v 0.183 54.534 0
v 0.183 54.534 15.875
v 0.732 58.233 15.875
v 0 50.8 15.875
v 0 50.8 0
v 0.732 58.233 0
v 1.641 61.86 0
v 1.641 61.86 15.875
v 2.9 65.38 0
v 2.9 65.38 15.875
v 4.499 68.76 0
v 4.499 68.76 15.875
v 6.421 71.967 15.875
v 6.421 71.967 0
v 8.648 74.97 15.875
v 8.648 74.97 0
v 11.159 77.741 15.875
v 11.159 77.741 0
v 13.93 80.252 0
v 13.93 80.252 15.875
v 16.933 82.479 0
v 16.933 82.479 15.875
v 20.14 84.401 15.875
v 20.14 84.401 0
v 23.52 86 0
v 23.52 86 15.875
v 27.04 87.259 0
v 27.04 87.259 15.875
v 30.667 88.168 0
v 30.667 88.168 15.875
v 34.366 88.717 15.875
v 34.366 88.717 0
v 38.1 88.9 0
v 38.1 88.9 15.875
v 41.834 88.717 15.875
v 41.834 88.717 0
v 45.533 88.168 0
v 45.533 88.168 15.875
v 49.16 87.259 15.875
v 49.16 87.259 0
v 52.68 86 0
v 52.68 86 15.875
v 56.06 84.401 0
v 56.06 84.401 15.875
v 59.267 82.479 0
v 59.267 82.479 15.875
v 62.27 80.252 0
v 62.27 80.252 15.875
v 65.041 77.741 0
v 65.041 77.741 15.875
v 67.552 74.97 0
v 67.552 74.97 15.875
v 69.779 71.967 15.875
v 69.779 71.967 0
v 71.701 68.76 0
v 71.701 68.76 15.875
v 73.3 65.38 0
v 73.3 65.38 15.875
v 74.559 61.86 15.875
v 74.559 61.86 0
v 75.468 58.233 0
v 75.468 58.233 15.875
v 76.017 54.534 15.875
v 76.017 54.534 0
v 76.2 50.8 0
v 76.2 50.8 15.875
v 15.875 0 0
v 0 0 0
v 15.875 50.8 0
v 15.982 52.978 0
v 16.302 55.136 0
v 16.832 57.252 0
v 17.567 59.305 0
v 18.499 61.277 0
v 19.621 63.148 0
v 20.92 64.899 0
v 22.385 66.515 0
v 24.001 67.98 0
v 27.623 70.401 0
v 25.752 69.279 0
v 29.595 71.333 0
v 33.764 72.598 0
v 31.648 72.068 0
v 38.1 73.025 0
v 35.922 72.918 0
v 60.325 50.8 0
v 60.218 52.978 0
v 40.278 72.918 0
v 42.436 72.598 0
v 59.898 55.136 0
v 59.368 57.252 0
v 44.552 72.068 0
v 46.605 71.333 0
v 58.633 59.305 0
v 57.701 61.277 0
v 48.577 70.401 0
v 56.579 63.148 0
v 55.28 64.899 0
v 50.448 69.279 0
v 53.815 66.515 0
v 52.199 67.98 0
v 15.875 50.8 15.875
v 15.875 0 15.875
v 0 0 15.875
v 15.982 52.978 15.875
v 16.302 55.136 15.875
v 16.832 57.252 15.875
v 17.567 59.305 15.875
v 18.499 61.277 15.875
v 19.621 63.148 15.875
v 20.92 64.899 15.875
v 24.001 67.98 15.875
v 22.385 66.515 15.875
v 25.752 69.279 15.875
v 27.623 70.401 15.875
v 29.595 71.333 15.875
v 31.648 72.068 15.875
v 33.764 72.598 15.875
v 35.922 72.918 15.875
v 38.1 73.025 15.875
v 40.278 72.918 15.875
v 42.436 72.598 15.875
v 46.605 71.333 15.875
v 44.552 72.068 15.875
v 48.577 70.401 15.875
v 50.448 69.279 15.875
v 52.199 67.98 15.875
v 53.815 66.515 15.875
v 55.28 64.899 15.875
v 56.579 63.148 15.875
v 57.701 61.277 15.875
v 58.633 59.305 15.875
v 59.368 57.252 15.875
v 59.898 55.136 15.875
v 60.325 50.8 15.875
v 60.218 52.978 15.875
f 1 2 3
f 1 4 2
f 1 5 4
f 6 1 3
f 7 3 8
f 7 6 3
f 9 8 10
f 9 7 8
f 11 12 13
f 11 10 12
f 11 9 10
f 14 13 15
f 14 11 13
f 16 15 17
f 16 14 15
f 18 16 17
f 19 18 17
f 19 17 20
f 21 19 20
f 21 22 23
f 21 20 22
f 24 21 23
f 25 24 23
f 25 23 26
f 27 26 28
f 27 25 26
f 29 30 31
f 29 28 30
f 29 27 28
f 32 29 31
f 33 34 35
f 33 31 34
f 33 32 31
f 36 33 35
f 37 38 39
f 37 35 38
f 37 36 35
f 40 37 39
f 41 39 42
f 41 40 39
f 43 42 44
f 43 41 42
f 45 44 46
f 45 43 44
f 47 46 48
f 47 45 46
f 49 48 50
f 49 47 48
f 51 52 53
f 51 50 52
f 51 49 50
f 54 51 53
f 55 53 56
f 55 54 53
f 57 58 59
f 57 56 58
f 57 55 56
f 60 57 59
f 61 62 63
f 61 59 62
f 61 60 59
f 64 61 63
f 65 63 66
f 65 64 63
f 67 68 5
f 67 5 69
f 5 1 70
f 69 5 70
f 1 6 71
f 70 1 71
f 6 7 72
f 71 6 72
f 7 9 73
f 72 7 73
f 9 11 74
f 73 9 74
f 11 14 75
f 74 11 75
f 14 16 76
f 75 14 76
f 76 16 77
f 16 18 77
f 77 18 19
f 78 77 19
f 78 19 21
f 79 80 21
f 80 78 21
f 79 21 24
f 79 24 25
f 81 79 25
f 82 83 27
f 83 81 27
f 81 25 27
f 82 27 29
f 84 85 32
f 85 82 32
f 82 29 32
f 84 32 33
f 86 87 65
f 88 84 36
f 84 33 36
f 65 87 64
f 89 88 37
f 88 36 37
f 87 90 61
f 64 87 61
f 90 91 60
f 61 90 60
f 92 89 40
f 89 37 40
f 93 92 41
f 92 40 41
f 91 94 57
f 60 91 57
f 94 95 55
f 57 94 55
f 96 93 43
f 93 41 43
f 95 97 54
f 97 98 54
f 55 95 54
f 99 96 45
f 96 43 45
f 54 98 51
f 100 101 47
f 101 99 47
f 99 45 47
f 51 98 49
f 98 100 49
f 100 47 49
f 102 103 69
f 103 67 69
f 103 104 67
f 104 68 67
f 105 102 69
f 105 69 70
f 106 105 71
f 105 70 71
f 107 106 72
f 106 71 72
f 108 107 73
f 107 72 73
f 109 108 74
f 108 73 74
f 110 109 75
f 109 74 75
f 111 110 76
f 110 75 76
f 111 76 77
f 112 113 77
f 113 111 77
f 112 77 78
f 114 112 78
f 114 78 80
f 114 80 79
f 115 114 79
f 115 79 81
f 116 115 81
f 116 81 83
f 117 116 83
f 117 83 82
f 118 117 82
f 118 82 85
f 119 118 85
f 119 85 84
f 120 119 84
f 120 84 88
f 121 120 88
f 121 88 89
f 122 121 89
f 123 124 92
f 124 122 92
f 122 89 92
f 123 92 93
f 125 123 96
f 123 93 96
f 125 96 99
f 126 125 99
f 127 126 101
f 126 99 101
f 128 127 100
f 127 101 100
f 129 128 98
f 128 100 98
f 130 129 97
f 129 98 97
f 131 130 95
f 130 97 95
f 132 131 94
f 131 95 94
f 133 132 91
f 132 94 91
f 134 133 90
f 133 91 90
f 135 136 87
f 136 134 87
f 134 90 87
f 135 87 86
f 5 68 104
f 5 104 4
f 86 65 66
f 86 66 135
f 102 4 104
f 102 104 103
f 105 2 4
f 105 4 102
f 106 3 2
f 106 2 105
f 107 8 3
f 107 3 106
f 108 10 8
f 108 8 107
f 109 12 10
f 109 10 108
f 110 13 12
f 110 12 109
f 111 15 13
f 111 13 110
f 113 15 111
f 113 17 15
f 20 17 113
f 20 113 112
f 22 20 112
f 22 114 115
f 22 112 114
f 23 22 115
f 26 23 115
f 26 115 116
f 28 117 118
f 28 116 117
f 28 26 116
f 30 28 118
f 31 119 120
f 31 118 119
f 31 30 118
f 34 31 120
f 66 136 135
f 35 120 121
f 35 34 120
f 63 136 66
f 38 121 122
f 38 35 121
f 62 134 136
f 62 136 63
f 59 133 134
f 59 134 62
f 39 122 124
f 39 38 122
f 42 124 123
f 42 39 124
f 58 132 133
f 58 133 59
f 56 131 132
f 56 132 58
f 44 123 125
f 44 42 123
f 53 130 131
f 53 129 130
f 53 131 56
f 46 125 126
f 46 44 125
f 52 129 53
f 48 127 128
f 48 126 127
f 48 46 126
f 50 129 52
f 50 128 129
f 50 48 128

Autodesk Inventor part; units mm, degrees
ref_plane "YZ Plane" through (0, 0, 0) normal (1, 0, 0) x (0, 1, 0)
ref_plane "XZ Plane" through (0, 0, 0) normal (0, 1, 0) x (-1, 0, 0)
ref_plane "XY Plane" through (0, 0, 0) normal (0, 0, 1) x (1, 0, 0)
sketch "Sketch1" plane through (0, 0, 0) normal (0, 0, 1) x (1, 0, 0)
  line L0 (0, 0) -> (0, 50.8)
  line L1 (-12.3149, 50.587) -> (-12.3149, 50.587)
  arc A0 (76.2, 50.8) -> (0, 50.8) centre (38.1, 50.8) ccw
  line L2 (0, 0) -> (15.875, 0)
  line L3 (15.875, 0) -> (15.875, 50.8)
  arc A1 (60.325, 50.8) -> (15.875, 50.8) centre (38.1, 50.8) ccw
  line L4 (76.2, 50.8) -> (60.325, 50.8)
  line L5 (8.5732, 88.9) -> (68.624, 88.9) construction
  dimension "d1" = 15.875
  dimension "d3" = 50.8
  dimension "d6" = 38.1
extrude "Extrusion1" add sketch "Sketch1" along normal blind 15.875
equation "\"d4\" = d1"
properties part number "TelescopeHook"
